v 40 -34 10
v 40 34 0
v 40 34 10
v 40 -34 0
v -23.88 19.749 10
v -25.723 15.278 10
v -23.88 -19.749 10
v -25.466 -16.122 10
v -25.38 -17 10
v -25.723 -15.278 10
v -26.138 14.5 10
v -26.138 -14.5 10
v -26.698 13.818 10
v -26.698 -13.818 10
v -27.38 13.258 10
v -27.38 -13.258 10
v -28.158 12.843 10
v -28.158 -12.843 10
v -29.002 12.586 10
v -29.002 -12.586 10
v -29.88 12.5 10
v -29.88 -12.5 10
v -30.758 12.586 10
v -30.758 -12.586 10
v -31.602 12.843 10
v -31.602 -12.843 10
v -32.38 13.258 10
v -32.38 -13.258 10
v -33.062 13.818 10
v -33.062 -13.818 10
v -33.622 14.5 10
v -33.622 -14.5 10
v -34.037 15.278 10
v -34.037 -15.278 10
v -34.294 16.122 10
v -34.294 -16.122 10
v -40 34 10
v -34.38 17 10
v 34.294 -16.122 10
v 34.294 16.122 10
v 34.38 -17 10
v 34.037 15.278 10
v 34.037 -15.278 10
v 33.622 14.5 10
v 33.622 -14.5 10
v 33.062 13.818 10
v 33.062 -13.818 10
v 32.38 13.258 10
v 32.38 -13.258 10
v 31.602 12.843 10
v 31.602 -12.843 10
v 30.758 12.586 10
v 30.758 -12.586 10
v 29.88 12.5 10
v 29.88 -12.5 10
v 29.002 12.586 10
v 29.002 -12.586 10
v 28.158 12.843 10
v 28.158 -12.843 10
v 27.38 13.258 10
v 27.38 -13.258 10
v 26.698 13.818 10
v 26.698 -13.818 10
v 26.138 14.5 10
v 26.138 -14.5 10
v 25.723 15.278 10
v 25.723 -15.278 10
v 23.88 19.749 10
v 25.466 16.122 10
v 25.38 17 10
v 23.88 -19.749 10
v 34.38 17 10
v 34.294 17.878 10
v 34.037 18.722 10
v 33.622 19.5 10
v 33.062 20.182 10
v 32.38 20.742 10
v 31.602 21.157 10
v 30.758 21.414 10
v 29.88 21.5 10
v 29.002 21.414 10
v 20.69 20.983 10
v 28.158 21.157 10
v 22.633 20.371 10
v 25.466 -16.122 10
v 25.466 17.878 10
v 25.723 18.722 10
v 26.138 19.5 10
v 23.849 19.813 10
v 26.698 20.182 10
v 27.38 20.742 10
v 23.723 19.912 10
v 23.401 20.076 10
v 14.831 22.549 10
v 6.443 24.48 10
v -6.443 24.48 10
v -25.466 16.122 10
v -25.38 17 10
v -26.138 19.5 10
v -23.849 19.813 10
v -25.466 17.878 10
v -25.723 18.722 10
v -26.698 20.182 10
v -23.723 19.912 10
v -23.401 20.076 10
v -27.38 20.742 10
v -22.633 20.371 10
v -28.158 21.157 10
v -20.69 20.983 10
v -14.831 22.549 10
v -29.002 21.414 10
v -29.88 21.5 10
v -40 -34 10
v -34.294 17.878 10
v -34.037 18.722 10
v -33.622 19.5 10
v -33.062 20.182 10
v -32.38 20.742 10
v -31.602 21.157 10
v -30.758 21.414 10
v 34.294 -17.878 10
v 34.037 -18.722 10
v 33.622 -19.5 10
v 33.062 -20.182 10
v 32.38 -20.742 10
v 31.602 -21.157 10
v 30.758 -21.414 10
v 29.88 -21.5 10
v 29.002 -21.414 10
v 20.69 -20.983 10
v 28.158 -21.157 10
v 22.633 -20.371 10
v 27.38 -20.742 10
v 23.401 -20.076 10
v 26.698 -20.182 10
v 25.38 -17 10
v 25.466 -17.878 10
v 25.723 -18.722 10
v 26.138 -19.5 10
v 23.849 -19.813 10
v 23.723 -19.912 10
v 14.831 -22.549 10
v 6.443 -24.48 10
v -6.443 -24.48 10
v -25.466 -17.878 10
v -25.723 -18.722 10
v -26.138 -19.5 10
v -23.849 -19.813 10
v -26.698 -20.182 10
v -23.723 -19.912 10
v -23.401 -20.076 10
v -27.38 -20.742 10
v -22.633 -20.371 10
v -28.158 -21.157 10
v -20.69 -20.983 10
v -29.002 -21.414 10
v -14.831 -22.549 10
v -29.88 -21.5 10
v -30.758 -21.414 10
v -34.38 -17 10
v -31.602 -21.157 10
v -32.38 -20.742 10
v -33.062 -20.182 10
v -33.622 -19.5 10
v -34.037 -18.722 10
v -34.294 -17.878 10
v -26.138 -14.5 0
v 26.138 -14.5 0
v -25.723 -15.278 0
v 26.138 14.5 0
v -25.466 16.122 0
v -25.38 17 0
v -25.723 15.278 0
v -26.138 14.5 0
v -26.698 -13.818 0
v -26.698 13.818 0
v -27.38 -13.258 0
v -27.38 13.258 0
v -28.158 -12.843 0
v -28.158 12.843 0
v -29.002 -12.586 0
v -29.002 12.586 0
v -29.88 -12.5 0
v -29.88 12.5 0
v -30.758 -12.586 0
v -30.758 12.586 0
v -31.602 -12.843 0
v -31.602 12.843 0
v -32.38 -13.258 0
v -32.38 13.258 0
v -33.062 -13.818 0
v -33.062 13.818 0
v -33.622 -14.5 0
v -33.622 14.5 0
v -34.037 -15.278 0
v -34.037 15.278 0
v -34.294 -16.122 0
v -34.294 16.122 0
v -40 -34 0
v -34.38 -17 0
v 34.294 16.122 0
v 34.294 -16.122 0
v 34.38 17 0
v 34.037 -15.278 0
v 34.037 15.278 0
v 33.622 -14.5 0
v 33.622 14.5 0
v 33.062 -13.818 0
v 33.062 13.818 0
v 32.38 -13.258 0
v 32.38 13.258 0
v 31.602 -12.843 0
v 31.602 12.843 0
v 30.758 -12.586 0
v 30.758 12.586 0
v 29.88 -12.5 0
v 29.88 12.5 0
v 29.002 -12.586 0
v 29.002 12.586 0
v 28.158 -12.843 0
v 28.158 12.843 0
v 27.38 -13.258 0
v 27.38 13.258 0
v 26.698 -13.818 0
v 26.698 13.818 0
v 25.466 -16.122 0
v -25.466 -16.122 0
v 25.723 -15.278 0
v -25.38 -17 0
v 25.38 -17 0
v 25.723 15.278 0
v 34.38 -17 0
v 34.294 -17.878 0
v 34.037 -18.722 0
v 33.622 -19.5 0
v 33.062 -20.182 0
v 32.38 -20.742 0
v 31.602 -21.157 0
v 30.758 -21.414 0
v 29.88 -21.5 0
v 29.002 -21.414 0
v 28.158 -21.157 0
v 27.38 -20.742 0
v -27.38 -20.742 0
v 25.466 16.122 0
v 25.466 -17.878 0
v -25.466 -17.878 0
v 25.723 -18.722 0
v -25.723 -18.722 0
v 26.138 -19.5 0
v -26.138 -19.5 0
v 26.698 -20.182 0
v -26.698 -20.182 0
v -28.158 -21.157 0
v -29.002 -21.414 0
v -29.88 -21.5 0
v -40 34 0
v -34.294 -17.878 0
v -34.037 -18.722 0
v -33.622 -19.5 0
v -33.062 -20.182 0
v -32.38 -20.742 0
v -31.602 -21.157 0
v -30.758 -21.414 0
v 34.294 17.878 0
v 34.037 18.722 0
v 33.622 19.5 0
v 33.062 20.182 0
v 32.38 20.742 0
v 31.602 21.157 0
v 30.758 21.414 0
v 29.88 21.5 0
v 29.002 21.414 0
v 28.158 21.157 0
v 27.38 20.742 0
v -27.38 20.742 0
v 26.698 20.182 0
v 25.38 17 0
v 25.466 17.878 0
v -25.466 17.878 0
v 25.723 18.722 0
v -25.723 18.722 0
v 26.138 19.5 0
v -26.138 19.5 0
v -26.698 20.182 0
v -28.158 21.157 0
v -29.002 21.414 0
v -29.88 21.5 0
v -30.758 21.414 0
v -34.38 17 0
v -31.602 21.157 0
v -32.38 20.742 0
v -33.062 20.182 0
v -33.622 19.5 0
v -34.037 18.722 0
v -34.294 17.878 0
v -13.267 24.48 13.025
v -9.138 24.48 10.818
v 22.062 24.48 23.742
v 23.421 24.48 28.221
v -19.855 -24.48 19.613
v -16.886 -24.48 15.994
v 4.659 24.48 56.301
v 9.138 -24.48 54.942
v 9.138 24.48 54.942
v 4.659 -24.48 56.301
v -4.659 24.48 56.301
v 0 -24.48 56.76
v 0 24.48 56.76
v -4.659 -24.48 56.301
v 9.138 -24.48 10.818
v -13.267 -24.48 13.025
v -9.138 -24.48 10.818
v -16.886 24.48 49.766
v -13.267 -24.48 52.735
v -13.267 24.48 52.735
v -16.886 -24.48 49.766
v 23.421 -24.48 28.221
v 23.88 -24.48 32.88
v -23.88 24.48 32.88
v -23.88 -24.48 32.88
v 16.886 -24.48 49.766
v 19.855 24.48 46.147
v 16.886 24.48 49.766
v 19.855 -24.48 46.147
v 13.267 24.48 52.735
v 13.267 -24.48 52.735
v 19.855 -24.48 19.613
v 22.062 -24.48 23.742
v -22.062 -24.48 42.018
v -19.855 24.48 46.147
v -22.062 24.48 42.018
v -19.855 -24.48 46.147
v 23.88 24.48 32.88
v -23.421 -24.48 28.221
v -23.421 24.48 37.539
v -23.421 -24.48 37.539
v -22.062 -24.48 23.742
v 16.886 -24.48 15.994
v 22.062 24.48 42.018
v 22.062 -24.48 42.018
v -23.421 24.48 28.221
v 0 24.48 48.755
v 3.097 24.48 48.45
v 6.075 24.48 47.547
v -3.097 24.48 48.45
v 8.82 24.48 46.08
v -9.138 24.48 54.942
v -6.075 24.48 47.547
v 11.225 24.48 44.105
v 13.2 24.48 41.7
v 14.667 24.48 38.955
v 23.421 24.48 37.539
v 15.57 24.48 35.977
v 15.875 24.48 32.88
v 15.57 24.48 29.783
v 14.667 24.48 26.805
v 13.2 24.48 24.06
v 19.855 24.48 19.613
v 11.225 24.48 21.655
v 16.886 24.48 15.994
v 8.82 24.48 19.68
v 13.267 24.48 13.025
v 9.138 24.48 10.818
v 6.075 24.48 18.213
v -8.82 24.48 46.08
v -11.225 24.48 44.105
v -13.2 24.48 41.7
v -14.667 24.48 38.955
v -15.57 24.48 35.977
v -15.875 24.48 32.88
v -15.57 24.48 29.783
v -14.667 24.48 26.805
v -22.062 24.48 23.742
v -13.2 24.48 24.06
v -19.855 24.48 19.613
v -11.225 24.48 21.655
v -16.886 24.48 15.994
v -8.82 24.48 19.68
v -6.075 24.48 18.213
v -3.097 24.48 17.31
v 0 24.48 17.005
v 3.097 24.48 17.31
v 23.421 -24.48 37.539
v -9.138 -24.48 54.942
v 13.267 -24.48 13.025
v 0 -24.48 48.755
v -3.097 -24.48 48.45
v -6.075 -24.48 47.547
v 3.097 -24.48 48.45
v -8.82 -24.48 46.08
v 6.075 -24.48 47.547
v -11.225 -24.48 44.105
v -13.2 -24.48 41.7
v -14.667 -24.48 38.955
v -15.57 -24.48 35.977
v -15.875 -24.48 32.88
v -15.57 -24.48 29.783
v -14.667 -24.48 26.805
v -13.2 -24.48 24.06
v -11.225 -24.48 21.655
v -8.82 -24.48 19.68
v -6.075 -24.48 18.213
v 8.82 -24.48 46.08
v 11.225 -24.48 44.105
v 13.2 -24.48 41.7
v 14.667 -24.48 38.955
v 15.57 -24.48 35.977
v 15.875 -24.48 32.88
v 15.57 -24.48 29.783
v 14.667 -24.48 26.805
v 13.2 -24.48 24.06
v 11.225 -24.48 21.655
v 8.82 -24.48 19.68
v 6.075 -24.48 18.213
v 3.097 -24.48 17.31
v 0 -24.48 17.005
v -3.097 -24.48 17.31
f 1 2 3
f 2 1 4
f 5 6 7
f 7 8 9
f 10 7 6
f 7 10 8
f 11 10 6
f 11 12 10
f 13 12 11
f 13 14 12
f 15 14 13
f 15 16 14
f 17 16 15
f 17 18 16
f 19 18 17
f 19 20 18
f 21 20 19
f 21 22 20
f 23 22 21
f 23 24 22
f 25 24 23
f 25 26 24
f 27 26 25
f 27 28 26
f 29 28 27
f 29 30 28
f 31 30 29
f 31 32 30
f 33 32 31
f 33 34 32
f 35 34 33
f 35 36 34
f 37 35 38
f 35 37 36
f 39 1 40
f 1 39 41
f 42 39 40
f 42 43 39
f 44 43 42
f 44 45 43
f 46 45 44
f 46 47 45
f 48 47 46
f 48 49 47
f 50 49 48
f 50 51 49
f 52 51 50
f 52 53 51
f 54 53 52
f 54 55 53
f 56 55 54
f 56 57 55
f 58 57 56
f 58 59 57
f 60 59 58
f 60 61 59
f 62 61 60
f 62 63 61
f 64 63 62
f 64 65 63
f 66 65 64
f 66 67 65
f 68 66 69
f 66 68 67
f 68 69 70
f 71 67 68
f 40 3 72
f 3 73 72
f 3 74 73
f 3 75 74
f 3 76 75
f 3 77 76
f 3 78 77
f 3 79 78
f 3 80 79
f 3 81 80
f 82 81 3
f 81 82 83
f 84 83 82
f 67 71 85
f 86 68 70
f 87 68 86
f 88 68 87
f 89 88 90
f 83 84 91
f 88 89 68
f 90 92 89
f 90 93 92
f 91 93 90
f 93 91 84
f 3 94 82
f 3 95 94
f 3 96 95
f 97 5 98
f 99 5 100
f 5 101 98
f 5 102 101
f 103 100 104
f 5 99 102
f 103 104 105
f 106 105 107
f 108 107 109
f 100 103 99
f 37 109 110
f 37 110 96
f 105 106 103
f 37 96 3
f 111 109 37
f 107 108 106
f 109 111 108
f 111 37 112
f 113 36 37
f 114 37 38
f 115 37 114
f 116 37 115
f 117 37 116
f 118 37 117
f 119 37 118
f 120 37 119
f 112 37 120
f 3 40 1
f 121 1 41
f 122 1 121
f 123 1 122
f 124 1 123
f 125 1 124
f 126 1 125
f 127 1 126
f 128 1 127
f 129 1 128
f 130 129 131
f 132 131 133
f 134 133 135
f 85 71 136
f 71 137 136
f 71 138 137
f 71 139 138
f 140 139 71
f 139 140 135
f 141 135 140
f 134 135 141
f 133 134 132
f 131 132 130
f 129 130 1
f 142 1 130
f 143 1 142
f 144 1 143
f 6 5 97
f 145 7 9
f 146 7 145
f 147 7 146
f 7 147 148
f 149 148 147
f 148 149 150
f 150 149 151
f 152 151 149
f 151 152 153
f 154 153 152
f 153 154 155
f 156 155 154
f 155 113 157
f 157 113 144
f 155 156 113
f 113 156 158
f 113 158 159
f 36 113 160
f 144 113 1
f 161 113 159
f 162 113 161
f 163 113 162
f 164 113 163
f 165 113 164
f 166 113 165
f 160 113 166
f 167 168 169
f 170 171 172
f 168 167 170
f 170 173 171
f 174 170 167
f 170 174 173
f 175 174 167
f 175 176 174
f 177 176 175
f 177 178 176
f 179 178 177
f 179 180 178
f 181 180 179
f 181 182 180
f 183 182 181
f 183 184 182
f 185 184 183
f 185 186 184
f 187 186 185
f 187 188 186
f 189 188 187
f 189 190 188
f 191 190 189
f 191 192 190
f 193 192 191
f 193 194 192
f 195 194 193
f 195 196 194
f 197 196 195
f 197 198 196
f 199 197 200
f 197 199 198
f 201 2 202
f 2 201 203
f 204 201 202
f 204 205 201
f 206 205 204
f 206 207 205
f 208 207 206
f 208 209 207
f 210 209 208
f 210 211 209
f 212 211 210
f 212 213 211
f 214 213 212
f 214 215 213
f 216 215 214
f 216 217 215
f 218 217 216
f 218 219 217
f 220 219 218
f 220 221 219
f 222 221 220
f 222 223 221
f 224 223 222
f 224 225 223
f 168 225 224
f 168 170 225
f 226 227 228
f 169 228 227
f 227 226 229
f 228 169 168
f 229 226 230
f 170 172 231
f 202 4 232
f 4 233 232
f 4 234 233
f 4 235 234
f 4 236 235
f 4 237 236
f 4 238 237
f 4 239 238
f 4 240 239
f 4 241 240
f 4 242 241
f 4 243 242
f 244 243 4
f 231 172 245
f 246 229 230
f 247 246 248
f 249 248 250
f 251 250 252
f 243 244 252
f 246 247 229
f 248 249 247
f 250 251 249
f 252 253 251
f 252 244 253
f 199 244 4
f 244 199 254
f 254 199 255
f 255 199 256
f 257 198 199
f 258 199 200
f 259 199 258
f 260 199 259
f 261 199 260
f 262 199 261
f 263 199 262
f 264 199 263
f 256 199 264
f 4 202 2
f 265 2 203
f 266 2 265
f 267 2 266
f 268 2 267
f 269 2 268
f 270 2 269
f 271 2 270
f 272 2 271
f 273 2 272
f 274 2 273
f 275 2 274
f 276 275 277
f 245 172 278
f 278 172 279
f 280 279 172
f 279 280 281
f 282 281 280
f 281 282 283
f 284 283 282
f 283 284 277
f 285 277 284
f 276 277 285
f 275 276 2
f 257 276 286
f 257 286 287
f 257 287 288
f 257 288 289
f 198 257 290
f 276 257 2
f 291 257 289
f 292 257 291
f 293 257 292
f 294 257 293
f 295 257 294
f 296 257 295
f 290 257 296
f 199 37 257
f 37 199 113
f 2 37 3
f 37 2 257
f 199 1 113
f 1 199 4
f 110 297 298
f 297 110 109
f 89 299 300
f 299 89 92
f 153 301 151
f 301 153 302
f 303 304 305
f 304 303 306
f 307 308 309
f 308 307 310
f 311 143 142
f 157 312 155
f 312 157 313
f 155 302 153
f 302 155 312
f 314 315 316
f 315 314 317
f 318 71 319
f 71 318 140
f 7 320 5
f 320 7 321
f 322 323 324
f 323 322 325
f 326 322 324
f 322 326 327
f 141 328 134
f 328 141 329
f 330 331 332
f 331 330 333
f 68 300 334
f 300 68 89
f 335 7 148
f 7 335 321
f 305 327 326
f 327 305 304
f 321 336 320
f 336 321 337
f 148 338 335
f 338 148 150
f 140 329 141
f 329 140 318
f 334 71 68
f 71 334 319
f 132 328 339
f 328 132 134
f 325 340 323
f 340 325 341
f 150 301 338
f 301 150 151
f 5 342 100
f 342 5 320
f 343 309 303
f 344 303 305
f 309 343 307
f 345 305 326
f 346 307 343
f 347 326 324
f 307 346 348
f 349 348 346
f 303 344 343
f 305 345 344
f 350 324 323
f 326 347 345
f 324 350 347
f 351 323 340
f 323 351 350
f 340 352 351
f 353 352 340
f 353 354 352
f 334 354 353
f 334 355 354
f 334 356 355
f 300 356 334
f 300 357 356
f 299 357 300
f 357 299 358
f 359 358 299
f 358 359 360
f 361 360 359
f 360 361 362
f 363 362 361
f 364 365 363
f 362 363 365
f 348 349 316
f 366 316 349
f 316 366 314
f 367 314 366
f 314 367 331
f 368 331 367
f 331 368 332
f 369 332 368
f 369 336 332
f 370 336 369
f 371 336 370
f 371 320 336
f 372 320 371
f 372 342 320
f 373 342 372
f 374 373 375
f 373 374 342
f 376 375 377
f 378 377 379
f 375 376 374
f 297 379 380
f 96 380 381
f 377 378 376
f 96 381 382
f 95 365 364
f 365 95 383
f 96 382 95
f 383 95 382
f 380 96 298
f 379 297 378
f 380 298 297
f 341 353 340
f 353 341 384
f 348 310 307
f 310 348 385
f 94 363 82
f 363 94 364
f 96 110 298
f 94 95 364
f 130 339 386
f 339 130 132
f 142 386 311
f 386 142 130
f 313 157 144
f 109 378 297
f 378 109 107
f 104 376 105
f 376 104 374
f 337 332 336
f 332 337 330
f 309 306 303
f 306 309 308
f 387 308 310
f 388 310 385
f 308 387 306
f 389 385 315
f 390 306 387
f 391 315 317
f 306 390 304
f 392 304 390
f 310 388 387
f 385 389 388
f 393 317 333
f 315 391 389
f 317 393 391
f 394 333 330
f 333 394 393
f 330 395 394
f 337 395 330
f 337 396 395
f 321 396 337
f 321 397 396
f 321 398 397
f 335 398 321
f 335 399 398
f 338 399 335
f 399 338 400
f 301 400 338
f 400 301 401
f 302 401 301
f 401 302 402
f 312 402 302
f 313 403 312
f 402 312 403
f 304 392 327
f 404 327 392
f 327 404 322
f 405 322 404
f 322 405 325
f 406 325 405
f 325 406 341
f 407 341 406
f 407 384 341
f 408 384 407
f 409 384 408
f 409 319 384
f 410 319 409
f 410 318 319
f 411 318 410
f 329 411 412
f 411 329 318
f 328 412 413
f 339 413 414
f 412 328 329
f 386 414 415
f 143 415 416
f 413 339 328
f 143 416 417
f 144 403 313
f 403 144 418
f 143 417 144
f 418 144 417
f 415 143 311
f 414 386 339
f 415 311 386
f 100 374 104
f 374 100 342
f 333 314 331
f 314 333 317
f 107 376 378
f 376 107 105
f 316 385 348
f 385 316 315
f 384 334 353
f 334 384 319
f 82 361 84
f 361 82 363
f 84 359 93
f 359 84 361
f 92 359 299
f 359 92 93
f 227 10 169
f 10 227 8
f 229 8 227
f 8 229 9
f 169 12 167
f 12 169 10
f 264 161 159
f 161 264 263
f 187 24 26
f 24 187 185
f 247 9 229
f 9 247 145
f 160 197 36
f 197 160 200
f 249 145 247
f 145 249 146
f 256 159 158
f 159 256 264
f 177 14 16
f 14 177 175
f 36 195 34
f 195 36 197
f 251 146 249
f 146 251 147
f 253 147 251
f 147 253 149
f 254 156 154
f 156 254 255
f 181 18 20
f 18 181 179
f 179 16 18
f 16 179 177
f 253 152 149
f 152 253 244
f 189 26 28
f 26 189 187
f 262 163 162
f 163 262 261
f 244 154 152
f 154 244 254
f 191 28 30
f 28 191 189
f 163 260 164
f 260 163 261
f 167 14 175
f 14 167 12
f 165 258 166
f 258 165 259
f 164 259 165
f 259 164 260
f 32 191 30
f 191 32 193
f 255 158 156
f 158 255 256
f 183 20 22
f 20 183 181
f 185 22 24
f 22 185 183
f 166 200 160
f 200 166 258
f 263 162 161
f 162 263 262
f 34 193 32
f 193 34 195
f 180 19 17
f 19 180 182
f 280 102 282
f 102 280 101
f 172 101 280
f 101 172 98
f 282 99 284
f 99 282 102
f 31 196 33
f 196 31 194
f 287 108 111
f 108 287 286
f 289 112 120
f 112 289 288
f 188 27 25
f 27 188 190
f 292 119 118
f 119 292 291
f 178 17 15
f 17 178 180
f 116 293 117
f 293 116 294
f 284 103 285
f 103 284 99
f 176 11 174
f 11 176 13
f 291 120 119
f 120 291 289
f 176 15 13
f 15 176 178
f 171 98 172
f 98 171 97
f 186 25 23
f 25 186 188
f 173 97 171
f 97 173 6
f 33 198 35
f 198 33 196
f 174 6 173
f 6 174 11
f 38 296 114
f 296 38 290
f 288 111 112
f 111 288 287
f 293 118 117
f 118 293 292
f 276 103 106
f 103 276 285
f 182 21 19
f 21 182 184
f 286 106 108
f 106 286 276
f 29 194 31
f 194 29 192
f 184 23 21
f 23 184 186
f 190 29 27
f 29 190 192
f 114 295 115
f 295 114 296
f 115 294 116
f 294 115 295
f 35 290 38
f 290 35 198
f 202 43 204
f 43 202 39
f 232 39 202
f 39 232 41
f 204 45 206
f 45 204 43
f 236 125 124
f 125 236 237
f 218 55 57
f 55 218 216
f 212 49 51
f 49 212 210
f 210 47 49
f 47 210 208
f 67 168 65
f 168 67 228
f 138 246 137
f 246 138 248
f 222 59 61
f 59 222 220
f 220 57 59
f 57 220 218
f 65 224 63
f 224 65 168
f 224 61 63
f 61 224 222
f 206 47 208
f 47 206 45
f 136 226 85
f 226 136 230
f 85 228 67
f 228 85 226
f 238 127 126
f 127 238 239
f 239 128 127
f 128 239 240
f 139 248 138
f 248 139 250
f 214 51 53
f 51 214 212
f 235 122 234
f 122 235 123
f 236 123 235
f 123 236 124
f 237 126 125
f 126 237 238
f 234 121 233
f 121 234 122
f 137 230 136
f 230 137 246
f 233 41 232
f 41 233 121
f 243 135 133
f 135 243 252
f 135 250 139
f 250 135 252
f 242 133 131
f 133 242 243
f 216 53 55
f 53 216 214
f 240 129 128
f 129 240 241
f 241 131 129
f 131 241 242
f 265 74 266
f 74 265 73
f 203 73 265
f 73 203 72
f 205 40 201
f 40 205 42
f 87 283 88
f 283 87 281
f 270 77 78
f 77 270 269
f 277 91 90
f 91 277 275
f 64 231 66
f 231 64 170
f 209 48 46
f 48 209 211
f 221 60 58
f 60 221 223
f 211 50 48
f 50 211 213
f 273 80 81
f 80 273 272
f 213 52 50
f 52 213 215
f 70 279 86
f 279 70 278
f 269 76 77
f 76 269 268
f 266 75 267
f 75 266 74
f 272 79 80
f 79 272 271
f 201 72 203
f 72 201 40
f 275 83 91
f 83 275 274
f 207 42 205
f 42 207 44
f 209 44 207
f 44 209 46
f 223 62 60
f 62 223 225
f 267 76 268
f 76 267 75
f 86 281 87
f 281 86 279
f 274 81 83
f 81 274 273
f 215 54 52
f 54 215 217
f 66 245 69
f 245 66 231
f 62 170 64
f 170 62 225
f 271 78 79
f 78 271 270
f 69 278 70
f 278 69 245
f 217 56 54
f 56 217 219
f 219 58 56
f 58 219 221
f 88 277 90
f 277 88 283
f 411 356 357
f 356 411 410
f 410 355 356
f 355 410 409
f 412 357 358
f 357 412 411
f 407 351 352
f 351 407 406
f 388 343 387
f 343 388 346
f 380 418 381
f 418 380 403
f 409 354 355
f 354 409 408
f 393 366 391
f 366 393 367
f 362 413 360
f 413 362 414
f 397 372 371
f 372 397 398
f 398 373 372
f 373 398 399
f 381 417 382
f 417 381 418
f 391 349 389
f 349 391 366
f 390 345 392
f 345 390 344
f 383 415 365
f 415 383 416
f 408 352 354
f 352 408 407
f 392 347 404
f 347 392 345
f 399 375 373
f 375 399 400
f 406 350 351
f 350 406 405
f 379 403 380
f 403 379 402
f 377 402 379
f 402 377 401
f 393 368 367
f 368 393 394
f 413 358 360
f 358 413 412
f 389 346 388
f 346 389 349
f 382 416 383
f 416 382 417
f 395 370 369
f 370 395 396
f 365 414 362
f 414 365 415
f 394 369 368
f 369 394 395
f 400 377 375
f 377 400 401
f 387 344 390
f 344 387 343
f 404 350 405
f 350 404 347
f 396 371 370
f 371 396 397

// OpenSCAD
$fn = 32;

// ----------------------------------------------------------------------
// Bearing block: 80 x 68 mm base, 31.75 mm bore at 32.88 mm
// ----------------------------------------------------------------------

// --- parameters (mm) ---
base_w = 80;              // base width
base_d = 68;              // base depth
base_t = 10;              // base thickness
bore_d = 31.75;           // shaft / bearing bore
house_r = 23.88;          // housing outer radius
house_len = 48.96;        // housing length along the shaft
foot_w = 47.76;           // foot width under the housing
foot_len = 38.96;         // foot length along the shaft
axis_z = 32.88;           // bore axis height above the base
holes_d = 9;              // mounting holes
hole_x = 29.88;           // mounting hole spacing

difference() {
  union() {
    /* base plate with its underside on z = 0 */
    translate([0, 0, base_t / 2]) cube([base_w, base_d, base_t], center = true);
    /* hull foot: a straight web blending into the round housing */
    hull() {
      translate([0, 0, base_t - 0.5]) cube([foot_w, foot_len, 1.6], center = true);
      translate([0, 0, axis_z]) rotate([-90, 0, 0]) cylinder(h = house_len, d = 2 * house_r, center = true);
    }
  }
  /* bore through the housing, 2.5 mm clear on both sides */
  translate([0, 0, axis_z]) rotate([-90, 0, 0]) cylinder(h = house_len + 5, d = bore_d, center = true);
  /* mounting holes through the base plate */
  for (hx = [-29.88, 29.88]) {
    for (hy = [-17, 17]) {
      translate([hx, hy, -2.5]) cylinder(h = base_t + 5, d = holes_d);
    }
  }
}
